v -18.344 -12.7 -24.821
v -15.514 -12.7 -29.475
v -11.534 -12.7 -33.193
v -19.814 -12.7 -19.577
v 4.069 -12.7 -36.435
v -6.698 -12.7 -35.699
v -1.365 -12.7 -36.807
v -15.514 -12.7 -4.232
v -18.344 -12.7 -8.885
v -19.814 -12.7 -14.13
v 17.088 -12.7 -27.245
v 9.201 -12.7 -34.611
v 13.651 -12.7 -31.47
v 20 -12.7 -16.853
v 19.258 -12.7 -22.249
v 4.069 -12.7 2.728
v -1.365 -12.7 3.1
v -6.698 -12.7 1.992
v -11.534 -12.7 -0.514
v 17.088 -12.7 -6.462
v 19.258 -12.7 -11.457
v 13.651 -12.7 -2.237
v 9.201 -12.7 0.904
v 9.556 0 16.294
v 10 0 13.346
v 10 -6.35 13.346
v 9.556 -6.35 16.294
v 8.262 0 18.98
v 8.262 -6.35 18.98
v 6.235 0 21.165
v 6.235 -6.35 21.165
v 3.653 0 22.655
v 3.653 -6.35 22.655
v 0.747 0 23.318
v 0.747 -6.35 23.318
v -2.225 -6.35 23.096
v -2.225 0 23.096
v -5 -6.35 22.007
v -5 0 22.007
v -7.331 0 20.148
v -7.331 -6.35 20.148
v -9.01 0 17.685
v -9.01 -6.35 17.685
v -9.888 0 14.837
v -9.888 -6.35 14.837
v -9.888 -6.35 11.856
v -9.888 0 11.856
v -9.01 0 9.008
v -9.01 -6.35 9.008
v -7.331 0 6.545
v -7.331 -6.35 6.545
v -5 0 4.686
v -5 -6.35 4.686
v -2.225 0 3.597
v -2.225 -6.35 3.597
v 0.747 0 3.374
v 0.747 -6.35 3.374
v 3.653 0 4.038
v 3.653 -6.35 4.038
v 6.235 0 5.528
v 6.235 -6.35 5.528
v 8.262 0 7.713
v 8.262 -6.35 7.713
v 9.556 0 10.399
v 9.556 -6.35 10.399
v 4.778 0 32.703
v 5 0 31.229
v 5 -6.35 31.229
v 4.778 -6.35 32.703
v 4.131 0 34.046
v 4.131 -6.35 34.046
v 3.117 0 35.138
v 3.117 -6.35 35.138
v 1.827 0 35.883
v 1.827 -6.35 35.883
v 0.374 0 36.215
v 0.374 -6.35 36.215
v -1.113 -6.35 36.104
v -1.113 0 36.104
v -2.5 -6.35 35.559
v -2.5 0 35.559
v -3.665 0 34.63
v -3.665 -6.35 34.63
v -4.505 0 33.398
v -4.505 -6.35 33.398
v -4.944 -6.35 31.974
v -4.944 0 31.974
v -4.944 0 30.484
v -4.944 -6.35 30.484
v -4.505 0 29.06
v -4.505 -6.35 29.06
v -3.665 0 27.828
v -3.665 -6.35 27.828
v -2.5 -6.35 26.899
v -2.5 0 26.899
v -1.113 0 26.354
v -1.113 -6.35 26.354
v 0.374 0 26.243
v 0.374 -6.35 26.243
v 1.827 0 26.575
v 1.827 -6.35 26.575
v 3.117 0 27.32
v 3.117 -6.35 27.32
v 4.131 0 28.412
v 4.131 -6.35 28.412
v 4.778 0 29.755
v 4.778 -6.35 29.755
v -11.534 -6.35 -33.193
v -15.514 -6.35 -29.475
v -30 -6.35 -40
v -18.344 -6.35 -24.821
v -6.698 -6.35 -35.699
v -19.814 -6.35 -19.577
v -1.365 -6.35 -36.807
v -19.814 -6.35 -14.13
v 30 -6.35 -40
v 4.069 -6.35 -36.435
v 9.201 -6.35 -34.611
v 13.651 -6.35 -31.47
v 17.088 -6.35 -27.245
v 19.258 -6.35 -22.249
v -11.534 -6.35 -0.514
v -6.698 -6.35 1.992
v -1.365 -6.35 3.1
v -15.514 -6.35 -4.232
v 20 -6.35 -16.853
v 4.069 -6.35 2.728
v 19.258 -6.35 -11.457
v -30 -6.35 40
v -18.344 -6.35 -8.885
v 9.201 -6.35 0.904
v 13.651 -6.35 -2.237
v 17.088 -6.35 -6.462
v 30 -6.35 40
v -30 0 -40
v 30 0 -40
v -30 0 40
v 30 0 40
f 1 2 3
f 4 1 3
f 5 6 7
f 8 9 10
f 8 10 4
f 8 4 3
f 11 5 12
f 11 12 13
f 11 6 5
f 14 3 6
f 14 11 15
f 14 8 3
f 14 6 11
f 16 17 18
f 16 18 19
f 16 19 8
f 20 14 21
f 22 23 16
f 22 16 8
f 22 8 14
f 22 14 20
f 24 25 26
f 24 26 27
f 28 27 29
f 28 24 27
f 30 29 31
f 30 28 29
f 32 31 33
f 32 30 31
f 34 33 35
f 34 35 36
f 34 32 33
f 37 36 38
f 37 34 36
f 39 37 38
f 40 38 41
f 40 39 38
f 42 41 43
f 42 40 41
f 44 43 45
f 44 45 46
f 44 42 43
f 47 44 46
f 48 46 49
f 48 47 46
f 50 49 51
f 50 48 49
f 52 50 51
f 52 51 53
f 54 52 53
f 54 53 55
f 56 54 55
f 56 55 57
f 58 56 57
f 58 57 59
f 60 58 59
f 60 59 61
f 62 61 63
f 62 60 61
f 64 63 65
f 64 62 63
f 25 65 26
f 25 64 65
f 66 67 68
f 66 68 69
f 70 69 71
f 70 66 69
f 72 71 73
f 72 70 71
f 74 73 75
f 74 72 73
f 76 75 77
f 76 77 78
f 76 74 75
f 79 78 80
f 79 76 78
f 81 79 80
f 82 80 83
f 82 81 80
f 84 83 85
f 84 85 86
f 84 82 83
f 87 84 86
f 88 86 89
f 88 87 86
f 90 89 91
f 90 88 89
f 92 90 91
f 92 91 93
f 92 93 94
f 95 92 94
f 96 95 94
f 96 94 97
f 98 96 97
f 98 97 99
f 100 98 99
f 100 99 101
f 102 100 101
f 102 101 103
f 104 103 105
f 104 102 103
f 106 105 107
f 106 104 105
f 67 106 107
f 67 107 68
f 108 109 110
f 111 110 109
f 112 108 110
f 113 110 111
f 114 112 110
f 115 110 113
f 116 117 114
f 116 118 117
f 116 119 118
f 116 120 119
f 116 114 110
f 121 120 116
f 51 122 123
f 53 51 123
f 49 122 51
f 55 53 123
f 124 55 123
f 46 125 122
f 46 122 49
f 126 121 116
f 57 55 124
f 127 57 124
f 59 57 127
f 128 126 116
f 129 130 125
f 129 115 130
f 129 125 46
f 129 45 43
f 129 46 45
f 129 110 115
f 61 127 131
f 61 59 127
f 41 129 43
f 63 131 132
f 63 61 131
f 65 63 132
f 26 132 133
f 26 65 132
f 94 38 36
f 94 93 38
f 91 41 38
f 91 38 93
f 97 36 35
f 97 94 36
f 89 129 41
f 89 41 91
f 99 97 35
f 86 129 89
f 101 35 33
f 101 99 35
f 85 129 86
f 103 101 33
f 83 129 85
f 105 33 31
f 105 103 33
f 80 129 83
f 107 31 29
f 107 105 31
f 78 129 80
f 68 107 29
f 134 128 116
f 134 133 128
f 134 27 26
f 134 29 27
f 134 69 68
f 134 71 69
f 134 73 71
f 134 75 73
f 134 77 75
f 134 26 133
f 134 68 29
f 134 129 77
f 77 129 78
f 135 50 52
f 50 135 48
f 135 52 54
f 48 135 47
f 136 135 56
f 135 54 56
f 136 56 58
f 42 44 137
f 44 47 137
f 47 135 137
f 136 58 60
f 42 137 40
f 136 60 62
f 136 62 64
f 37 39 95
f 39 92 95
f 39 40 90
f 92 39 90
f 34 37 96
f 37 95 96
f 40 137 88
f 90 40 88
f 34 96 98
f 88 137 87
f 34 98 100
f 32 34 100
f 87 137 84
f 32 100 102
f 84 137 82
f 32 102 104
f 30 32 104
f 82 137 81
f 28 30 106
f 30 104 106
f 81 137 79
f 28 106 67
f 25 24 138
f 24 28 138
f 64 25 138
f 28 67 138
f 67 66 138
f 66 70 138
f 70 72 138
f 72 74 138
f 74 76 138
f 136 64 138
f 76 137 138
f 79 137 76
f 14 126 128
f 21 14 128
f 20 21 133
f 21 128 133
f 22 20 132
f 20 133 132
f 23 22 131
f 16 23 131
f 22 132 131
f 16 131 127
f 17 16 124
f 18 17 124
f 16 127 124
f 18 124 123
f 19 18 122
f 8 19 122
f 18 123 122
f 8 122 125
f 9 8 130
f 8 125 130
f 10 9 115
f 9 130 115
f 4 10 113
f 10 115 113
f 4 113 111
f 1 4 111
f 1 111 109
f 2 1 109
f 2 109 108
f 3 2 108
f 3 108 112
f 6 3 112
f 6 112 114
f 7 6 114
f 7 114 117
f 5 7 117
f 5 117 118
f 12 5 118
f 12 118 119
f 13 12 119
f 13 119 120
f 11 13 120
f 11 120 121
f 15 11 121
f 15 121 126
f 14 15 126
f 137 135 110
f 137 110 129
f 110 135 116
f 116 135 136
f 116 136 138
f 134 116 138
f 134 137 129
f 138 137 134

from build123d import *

# Parameters (mm, degrees)
F0_W     = 60
F0_H     = 80
F0_R     = 20
F0_R_2   = 10
F0_R_3   = 5
F1_DEPTH = 6.35
F2_DEPTH = 12.7


# Not quite as in the source:
# - a feature names something its author has since deleted; it is built from what else it names


with BuildPart() as f1:
    # F0 (on Front) → F1 (new body)
    with BuildSketch(Plane.XZ):
        Rectangle(F0_W, F0_H)
        with Locations((0, -16.8533538189)):
            Circle(F0_R, mode=Mode.SUBTRACT)
        with Locations((0, 13.3463527084)):
            Circle(F0_R_2, mode=Mode.SUBTRACT)
        with Locations((0, 31.2290439901)):
            Circle(F0_R_3, mode=Mode.SUBTRACT)
    extrude(amount=F1_DEPTH)

    # F0 (on Front) → F2 (join)
    with BuildSketch(Plane.XZ):
        with Locations((0, -16.8533538189)):
            Circle(F0_R)
    extrude(amount=F2_DEPTH)


solid = f1.part
